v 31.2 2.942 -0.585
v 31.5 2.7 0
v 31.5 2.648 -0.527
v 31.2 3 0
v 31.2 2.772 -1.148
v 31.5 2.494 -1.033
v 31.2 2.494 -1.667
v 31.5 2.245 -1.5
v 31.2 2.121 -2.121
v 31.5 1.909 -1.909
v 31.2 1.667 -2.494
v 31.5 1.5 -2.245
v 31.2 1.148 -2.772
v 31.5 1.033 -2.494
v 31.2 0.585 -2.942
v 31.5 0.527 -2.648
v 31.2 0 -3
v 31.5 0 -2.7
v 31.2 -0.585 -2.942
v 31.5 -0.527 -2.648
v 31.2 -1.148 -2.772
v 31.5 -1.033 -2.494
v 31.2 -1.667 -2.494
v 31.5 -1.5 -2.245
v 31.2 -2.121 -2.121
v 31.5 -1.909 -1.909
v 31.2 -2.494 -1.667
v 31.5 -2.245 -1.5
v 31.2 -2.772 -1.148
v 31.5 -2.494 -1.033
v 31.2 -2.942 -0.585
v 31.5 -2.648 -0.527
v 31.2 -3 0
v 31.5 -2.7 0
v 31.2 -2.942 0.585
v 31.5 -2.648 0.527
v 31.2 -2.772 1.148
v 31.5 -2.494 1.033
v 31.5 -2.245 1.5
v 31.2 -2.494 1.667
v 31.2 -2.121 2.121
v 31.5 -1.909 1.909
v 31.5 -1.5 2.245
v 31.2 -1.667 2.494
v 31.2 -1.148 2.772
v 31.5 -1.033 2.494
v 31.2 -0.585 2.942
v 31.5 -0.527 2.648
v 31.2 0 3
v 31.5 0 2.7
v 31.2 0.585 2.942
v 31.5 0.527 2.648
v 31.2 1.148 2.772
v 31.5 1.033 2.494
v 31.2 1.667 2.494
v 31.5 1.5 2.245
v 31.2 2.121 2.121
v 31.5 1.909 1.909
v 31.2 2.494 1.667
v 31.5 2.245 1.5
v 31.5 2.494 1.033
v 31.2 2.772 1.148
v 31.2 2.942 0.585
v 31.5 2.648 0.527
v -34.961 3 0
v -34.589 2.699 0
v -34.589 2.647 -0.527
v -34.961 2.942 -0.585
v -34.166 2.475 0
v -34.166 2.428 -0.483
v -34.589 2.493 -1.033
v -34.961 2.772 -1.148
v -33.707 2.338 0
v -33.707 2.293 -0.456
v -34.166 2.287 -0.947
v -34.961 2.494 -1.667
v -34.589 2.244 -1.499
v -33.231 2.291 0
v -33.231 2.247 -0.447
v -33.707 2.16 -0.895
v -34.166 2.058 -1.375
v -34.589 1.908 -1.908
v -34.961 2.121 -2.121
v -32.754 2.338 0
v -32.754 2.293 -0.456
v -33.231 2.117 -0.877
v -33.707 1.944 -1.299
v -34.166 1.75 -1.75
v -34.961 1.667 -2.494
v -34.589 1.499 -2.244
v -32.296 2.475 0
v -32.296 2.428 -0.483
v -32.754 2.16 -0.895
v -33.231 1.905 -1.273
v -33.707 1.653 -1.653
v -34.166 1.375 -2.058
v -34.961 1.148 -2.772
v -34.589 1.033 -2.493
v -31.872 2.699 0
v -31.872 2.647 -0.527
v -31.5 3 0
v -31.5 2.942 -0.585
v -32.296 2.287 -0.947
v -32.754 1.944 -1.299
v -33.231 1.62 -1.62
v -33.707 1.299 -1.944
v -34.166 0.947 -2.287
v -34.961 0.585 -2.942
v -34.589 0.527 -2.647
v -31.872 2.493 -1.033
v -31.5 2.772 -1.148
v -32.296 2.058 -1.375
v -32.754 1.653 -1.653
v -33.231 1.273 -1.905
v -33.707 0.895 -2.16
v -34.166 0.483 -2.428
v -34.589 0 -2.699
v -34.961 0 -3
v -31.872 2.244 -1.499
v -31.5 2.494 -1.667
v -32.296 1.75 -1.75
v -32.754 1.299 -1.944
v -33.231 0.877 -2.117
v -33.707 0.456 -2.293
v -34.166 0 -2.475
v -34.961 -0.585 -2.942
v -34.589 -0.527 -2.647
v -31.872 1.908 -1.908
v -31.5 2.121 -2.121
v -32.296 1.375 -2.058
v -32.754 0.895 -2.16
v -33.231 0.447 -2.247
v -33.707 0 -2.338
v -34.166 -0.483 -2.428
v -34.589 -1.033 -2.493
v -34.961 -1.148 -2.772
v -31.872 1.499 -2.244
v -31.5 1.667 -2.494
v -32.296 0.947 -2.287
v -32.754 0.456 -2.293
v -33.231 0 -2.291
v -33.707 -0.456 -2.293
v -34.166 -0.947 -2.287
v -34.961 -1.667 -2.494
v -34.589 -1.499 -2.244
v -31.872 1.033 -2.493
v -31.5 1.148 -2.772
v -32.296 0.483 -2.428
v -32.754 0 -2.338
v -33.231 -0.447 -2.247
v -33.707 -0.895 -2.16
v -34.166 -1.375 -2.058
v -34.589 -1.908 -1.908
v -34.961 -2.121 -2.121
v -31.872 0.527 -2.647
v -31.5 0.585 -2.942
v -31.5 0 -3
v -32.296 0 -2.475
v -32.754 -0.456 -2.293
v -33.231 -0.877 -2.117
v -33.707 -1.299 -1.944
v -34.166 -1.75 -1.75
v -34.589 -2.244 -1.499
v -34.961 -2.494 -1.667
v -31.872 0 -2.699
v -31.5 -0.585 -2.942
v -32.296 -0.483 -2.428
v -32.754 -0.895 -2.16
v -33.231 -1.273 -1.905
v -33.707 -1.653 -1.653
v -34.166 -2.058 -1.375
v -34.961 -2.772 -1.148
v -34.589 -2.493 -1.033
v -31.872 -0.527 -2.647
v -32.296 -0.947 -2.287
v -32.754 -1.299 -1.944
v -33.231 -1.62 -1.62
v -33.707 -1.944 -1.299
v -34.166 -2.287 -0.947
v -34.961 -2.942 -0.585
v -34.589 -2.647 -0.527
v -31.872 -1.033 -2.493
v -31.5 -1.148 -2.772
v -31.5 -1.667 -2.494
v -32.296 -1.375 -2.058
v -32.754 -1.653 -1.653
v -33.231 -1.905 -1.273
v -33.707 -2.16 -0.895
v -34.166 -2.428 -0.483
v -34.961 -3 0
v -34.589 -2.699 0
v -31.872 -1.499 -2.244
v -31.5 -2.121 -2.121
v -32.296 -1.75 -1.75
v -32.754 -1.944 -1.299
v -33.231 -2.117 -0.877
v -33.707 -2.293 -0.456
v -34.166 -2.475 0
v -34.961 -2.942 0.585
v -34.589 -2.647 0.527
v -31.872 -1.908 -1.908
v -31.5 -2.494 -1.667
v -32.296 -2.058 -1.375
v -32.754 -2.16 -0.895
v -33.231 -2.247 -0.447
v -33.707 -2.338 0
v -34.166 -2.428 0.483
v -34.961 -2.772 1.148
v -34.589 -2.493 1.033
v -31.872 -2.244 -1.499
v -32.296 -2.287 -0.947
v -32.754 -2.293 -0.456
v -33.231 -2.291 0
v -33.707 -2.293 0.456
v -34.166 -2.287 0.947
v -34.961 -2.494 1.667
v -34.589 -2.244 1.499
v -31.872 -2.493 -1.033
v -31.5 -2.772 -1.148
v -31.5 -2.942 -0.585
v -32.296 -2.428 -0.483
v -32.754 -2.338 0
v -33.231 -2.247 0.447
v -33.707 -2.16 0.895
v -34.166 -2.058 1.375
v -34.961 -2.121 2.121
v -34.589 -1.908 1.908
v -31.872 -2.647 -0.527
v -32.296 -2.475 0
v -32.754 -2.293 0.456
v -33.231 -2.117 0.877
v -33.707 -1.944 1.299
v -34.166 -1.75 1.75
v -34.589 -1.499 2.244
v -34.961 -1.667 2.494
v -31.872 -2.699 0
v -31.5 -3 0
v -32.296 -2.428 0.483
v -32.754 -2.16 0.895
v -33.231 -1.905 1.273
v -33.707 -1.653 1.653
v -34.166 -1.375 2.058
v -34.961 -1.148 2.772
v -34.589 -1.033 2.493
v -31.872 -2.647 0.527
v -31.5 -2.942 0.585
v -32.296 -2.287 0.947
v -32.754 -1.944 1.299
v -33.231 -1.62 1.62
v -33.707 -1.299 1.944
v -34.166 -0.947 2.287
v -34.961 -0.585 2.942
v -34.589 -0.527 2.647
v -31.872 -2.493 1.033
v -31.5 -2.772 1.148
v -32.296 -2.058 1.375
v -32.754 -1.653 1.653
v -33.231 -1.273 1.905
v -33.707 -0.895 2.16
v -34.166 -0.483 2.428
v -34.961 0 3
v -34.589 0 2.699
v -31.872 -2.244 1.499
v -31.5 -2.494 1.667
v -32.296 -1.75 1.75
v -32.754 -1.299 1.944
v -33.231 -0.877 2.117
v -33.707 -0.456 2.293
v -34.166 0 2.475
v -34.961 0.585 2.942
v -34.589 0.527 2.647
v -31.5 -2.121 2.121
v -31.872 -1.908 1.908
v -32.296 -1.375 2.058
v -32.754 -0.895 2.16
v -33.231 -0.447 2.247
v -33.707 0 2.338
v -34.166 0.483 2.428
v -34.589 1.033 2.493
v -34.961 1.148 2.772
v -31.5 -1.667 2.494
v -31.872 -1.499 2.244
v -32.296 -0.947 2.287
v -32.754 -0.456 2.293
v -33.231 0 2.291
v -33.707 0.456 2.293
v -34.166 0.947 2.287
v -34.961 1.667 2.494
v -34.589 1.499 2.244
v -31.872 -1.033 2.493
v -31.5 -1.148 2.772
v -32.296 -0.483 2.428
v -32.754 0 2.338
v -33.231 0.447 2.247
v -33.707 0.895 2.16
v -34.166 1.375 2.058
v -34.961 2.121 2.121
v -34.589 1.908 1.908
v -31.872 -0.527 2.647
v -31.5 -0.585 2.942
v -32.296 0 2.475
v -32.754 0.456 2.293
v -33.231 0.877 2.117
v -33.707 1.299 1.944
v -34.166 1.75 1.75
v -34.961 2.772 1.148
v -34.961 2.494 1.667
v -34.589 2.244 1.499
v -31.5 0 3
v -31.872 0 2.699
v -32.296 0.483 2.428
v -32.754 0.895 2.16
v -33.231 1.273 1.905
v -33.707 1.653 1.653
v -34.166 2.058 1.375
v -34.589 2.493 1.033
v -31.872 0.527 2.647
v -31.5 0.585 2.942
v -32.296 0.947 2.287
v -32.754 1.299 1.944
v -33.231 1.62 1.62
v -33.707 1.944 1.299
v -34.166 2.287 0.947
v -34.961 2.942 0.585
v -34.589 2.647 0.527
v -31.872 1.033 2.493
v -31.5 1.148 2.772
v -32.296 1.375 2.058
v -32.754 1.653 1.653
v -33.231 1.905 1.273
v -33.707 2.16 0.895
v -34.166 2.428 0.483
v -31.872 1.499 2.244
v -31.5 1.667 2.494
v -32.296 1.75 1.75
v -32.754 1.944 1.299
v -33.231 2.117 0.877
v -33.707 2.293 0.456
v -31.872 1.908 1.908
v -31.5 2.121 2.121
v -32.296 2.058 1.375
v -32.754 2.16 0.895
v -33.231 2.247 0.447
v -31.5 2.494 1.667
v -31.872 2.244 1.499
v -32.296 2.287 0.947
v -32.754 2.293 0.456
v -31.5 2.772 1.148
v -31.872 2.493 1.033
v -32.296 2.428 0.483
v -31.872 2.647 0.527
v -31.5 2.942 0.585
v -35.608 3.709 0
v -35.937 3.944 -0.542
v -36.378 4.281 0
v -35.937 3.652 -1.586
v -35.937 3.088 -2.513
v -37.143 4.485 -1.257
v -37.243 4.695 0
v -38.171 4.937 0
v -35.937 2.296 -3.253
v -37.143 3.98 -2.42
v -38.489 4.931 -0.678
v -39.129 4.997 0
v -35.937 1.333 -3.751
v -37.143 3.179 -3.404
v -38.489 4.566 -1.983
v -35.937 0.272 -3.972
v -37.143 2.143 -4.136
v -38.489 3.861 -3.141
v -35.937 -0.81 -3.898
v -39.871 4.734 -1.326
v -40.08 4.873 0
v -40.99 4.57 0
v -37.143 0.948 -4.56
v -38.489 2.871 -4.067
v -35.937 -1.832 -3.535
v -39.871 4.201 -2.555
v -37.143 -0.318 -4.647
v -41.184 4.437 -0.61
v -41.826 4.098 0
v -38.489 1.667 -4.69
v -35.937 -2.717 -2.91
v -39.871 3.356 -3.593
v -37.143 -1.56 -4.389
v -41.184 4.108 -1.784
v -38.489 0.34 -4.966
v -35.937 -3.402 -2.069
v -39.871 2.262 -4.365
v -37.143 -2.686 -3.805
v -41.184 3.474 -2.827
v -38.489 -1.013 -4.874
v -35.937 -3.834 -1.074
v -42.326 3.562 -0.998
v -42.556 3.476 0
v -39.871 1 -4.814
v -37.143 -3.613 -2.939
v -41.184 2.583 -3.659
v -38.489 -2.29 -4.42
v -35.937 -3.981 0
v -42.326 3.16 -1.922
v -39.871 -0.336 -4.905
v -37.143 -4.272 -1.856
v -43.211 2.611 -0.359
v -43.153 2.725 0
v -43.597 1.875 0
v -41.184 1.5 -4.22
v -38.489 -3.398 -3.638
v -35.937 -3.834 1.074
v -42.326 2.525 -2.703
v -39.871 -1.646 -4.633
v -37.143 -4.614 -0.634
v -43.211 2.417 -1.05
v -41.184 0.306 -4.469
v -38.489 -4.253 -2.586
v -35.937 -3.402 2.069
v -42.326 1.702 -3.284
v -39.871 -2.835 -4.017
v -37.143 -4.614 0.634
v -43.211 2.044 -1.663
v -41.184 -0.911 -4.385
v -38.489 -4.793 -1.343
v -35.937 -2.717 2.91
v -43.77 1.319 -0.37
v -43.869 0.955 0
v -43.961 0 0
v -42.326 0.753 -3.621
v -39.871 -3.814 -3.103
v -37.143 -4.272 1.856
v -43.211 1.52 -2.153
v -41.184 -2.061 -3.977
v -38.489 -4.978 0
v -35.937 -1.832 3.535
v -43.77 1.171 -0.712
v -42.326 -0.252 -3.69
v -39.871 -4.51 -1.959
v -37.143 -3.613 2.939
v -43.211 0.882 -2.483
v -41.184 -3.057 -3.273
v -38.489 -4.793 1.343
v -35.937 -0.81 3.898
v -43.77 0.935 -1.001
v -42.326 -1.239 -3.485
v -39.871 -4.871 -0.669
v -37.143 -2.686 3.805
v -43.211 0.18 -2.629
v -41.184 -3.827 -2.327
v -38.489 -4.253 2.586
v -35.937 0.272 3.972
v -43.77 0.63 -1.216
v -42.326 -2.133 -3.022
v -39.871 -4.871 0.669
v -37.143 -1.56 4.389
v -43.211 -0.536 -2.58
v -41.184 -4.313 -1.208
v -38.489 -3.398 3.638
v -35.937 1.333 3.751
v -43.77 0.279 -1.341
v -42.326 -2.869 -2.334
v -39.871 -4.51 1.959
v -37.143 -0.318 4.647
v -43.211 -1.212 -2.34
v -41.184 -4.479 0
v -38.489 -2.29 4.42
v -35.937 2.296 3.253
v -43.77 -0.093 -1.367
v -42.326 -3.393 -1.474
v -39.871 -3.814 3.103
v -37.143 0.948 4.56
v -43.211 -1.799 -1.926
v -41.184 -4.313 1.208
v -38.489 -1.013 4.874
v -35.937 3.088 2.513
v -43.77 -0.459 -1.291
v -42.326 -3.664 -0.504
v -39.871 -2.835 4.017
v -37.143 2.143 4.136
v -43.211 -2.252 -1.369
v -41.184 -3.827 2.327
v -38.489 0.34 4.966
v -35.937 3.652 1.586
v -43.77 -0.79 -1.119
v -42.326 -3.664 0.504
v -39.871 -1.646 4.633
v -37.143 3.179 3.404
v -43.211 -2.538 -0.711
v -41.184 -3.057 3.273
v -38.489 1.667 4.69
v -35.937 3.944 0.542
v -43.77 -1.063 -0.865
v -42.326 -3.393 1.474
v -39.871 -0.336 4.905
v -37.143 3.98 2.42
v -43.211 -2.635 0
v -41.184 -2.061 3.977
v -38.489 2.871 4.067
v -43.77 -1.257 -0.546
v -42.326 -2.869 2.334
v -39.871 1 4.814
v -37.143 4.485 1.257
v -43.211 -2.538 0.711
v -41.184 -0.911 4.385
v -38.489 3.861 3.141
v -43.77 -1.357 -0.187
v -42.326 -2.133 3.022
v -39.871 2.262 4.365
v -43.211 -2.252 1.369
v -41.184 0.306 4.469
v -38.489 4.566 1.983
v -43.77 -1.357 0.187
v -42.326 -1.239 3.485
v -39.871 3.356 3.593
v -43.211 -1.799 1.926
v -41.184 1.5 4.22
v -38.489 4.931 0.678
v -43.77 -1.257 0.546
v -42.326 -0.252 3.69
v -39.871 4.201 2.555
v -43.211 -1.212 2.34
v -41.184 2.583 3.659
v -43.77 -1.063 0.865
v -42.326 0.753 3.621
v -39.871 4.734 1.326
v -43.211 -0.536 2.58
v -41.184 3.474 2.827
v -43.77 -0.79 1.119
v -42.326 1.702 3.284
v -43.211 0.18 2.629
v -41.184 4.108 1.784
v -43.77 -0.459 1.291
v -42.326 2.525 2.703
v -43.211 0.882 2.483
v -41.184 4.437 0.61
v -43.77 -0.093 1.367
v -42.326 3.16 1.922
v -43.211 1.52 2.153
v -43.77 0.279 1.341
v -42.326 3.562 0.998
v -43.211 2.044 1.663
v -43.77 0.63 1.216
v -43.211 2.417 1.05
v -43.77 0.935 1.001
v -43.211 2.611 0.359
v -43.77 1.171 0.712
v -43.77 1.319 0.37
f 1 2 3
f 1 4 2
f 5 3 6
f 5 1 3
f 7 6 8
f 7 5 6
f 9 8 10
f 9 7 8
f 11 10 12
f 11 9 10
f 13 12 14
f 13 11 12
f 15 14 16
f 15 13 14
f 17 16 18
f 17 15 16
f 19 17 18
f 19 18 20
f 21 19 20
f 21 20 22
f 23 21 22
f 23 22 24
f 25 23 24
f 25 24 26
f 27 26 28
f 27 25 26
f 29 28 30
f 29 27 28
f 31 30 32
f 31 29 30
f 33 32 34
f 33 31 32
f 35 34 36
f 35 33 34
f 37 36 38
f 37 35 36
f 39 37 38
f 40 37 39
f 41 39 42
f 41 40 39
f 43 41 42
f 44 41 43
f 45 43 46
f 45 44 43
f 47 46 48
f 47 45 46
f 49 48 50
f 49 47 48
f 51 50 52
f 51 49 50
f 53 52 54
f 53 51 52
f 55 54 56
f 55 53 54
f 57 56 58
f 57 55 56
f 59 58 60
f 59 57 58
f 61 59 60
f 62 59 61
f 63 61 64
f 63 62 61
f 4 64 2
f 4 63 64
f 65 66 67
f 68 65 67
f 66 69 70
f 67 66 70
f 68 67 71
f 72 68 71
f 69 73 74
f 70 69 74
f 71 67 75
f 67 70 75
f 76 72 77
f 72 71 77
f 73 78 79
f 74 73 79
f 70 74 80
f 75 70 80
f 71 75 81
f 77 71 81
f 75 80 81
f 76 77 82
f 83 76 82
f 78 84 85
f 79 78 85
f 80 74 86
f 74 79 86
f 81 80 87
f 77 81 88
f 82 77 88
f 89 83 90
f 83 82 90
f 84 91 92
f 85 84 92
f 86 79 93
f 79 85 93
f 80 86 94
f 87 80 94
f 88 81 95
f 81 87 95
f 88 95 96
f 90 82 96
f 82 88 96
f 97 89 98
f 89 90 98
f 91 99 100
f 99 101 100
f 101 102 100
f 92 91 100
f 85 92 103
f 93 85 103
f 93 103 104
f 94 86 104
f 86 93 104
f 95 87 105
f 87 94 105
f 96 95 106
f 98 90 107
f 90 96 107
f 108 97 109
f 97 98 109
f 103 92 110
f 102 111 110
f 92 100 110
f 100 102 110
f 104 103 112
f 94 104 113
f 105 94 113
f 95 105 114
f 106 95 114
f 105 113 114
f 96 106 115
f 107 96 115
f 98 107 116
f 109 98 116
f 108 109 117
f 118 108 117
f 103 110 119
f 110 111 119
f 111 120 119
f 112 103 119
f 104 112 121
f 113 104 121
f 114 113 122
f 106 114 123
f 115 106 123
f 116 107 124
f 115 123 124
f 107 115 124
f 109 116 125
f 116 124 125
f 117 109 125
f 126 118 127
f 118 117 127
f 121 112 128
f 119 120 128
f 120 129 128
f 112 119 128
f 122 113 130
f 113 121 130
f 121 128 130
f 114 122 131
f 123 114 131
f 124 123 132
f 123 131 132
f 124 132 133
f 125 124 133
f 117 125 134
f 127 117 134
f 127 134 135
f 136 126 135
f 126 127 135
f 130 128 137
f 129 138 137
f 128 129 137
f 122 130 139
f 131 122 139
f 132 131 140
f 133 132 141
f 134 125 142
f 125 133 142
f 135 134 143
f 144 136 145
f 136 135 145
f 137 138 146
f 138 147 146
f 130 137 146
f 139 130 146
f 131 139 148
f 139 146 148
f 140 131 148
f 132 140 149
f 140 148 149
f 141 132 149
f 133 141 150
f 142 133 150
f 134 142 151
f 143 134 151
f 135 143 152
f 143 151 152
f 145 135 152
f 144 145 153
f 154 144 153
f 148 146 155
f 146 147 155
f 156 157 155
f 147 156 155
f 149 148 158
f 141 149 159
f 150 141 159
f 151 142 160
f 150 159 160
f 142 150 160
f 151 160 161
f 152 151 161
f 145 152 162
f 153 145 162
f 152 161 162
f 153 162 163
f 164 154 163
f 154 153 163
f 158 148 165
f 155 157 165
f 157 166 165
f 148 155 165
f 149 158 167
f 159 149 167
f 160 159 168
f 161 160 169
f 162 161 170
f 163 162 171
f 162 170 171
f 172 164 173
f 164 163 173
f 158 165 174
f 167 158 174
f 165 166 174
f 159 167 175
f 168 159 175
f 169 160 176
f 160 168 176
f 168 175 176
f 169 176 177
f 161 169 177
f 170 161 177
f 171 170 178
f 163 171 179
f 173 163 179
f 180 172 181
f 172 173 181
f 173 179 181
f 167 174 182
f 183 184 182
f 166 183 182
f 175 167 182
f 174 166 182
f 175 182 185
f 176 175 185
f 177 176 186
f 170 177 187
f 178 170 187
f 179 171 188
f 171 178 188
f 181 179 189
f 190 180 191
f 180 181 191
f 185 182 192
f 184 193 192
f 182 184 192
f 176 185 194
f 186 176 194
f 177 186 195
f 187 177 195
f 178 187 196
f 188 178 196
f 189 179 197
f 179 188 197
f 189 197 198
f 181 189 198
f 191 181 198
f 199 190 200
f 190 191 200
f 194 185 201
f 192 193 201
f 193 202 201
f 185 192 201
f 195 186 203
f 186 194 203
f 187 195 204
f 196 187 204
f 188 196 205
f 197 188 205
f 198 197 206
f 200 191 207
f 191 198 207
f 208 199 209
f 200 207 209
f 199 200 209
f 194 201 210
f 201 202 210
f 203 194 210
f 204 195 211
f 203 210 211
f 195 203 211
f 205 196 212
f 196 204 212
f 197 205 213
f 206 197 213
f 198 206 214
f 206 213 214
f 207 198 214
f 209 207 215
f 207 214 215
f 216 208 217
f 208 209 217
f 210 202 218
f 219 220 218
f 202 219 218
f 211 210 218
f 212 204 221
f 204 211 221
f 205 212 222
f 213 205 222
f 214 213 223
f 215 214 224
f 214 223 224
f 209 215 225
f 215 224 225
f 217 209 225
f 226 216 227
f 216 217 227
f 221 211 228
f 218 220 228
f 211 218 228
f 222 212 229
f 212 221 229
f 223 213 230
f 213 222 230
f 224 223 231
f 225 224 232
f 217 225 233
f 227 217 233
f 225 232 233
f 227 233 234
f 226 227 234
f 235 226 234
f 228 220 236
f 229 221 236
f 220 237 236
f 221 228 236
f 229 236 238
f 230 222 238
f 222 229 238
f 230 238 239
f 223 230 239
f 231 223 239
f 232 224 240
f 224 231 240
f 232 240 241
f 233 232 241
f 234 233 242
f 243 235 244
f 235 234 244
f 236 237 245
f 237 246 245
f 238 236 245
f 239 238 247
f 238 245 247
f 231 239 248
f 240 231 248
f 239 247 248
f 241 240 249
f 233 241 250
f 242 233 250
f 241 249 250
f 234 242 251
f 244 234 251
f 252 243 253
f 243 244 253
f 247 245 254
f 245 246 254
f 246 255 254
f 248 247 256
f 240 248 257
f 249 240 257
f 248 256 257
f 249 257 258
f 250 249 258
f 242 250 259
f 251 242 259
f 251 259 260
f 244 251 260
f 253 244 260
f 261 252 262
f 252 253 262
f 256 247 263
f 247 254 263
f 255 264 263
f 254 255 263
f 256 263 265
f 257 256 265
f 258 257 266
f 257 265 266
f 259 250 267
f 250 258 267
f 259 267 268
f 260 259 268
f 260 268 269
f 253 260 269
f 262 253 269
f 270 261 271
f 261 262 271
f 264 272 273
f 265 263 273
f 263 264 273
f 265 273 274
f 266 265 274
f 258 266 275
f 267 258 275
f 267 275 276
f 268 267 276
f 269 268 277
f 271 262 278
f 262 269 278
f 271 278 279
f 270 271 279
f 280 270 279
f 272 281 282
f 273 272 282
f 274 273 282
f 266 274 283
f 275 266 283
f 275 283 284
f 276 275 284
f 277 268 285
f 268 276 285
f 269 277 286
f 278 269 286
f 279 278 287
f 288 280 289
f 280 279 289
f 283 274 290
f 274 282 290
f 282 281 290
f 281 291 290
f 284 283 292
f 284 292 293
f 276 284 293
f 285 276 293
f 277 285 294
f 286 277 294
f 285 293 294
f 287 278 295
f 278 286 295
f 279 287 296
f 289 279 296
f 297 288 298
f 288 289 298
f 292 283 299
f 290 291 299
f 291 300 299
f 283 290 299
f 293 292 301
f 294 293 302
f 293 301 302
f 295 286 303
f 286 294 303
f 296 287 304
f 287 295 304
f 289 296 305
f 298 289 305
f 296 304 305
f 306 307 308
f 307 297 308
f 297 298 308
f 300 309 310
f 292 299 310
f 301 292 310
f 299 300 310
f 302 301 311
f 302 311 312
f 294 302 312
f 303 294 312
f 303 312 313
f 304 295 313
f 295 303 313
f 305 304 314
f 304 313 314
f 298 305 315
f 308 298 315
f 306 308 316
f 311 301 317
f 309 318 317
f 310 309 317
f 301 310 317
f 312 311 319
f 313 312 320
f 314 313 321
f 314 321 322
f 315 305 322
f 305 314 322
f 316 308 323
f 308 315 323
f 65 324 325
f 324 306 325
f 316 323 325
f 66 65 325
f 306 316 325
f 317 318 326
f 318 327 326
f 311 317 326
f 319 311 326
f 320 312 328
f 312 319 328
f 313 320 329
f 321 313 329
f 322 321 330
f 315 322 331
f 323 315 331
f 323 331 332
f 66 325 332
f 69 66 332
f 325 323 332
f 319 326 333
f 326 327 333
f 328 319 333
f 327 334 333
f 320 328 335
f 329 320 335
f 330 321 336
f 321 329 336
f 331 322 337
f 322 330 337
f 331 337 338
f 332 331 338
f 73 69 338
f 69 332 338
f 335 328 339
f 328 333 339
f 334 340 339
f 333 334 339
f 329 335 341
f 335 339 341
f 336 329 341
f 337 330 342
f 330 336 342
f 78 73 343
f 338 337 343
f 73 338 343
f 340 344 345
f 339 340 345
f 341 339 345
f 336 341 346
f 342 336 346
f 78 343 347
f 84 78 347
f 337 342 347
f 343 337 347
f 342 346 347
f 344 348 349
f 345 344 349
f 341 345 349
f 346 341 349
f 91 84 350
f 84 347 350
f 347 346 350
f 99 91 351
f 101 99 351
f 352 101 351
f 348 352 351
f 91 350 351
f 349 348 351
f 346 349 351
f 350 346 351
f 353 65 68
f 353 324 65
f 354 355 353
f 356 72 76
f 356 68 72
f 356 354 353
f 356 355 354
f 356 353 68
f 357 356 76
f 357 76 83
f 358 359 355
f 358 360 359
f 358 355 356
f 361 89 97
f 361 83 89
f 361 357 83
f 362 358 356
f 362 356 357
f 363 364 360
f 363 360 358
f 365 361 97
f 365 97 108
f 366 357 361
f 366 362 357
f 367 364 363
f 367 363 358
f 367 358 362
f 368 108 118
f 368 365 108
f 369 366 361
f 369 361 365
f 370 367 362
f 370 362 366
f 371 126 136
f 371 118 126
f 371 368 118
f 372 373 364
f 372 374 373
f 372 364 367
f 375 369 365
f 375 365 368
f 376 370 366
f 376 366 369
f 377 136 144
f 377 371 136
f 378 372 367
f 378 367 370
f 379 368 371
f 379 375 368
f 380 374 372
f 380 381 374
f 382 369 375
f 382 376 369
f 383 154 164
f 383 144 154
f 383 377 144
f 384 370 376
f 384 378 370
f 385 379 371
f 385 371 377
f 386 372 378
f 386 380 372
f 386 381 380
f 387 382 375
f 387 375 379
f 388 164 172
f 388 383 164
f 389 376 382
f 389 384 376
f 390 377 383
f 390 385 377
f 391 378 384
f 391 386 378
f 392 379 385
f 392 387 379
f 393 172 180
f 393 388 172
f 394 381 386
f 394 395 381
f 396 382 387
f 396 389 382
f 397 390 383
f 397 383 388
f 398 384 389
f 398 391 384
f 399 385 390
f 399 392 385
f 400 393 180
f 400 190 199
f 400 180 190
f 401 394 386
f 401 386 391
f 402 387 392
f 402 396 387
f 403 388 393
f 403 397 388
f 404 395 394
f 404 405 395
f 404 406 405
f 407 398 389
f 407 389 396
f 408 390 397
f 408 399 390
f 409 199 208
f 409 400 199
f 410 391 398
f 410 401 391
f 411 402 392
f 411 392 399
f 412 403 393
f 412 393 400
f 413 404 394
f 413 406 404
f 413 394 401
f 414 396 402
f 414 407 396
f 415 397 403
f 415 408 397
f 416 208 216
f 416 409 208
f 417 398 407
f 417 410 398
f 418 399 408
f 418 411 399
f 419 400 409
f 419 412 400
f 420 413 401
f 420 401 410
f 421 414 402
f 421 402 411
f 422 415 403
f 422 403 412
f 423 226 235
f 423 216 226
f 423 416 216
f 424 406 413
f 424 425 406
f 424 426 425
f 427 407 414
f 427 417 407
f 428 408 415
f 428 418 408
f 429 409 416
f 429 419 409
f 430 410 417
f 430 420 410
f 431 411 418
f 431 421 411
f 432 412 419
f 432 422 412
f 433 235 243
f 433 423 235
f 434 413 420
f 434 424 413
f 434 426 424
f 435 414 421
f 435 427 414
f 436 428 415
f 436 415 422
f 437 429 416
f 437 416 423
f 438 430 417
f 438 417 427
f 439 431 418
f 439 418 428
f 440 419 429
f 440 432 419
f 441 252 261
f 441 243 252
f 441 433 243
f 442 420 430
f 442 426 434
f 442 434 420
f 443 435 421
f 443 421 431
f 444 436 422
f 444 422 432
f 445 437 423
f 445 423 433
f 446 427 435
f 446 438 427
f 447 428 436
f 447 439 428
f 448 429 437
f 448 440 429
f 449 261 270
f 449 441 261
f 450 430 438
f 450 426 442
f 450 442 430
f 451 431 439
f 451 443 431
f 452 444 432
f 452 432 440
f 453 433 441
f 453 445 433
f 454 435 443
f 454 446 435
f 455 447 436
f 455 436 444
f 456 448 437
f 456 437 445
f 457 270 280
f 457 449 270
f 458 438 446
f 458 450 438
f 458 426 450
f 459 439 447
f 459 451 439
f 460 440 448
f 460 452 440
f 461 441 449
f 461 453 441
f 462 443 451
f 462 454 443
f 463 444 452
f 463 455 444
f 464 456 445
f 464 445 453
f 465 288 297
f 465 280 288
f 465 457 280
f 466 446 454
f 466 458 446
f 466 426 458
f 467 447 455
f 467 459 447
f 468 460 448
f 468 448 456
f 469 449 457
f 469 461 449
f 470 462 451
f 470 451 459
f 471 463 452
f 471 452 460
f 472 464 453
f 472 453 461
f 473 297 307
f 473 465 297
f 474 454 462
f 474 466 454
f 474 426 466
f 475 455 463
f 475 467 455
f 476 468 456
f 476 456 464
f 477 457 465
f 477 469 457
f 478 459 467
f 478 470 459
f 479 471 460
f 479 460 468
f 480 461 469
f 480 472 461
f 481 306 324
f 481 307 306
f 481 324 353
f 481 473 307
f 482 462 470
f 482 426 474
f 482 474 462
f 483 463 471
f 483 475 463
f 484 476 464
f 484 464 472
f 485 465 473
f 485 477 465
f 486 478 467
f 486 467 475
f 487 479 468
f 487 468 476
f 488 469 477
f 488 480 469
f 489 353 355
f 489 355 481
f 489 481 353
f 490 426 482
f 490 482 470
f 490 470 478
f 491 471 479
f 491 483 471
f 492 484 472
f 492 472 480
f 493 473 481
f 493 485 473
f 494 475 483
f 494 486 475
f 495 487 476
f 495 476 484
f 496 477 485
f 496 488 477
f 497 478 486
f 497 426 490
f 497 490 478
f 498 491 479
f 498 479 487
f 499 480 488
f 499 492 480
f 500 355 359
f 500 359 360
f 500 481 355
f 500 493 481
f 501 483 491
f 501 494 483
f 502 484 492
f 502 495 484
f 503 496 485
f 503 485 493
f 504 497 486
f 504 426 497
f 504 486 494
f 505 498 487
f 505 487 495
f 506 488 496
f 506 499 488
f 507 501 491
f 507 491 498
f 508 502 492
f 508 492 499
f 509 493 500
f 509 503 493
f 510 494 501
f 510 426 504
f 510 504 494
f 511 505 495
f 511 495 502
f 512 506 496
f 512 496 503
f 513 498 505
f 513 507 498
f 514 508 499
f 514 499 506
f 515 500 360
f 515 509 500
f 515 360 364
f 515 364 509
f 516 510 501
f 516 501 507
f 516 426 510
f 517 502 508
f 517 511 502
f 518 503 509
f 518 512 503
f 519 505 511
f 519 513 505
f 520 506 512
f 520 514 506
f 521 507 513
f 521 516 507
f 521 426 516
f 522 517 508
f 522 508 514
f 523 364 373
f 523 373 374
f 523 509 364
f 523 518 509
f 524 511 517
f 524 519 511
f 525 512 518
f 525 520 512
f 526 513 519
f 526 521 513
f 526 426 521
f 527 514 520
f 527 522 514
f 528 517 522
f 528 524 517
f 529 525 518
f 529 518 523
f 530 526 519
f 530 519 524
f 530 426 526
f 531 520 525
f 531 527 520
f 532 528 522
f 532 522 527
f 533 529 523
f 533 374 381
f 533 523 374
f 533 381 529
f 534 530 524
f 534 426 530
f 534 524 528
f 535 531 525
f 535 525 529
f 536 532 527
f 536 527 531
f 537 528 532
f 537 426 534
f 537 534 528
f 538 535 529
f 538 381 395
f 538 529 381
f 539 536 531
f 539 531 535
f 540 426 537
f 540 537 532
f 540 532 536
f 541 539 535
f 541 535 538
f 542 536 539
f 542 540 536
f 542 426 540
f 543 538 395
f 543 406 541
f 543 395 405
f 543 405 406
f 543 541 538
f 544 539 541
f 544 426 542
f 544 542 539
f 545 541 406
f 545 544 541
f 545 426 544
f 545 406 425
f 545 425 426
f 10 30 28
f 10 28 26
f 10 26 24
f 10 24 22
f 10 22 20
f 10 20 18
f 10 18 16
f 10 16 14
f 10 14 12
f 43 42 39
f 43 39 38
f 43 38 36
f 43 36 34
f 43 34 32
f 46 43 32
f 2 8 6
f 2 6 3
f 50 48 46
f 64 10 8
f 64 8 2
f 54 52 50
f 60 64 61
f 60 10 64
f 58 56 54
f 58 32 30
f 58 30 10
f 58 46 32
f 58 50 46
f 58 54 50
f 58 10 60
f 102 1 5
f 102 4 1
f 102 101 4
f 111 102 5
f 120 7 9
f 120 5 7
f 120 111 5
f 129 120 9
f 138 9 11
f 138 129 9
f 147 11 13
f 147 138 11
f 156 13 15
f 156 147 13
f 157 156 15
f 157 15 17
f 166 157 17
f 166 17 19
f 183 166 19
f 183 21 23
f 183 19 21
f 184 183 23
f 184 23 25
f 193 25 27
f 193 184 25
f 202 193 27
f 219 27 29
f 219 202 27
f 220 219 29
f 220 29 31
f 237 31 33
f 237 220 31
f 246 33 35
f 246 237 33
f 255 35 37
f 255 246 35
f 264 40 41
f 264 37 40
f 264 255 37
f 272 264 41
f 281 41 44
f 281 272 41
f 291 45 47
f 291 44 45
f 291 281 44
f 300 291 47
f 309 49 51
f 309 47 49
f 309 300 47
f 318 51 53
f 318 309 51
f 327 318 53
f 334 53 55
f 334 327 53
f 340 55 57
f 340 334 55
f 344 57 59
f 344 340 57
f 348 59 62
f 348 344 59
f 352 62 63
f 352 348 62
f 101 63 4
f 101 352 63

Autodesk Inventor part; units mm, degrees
ref_plane "YZ Plane" through (0, 0, 0) normal (1, 0, 0) x (0, 1, 0)
ref_plane "XZ Plane" through (0, 0, 0) normal (0, 1, 0) x (-1, 0, 0)
ref_plane "XY Plane" through (0, 0, 0) normal (0, 0, 1) x (1, 0, 0)
sketch "Skizze1" plane through (0, 0, 0) normal (0, 0, 1) x (1, 0, 0)
  line L0 (0, -0.6) -> (0, 3.6) projected
  line L1 (-31.5, 0) -> (31.5, 0)
  line L2 (31.5, 0) -> (31.5, 3)
  line L3 (31.5, 3) -> (-31.5, 3)
  line L4 (-31.5, 3) -> (-31.5, 0)
  dimension "d2" = 63
  dimension "d3" = 3
revolve "Umdrehung1" add sketch "Skizze1" angle 360 about axis through (-31.5, 0, 0) along (1, 0, 0)
thread "Gewinde1" size "M6x1" class "6g" standard "ANSI Metric M Profile" full length
chamfer "Fase1" distance 0.3 angle 45 1 edges at (31.5, -3, 0)
sketch "Skizze2" plane through (0, 0, 0) normal (0, 0, 1) x (1, 0, 0)
  line L0 (-31.5, -3) -> (-31.5, 3) projected
  line L1 (31.2, -3) -> (31.2, 3) projected
  line L2 (-58.1911, 0) -> (44.3485, 0) projected
  line L3 (0, -4.8487) -> (0, 8.0921) projected
  arc A0 (-34.9614, 3) -> (-43.9614, 0) centre (-38.9614, 0) ccw
  arc A1 (-34.9614, 3) -> (-31.5, 3) centre (-33.2307, 4.7589) ccw
  line L4 (-31.5, -3) -> (-31.5, 3) projected
  line L5 (-43.9614, 0) -> (-31.5, 0)
  line L6 (-31.5, 3) -> (-31.5, 0)
  point P0 (0, 0)
  dimension "d10" = 5
revolve "Umdrehung2" add sketch "Skizze2" angle 360 about axis through (-43.9614, 0, 0) along (1, 0, 0)
properties part number "M6x60" material "Stahl, hochfest, niedrig legiert"
